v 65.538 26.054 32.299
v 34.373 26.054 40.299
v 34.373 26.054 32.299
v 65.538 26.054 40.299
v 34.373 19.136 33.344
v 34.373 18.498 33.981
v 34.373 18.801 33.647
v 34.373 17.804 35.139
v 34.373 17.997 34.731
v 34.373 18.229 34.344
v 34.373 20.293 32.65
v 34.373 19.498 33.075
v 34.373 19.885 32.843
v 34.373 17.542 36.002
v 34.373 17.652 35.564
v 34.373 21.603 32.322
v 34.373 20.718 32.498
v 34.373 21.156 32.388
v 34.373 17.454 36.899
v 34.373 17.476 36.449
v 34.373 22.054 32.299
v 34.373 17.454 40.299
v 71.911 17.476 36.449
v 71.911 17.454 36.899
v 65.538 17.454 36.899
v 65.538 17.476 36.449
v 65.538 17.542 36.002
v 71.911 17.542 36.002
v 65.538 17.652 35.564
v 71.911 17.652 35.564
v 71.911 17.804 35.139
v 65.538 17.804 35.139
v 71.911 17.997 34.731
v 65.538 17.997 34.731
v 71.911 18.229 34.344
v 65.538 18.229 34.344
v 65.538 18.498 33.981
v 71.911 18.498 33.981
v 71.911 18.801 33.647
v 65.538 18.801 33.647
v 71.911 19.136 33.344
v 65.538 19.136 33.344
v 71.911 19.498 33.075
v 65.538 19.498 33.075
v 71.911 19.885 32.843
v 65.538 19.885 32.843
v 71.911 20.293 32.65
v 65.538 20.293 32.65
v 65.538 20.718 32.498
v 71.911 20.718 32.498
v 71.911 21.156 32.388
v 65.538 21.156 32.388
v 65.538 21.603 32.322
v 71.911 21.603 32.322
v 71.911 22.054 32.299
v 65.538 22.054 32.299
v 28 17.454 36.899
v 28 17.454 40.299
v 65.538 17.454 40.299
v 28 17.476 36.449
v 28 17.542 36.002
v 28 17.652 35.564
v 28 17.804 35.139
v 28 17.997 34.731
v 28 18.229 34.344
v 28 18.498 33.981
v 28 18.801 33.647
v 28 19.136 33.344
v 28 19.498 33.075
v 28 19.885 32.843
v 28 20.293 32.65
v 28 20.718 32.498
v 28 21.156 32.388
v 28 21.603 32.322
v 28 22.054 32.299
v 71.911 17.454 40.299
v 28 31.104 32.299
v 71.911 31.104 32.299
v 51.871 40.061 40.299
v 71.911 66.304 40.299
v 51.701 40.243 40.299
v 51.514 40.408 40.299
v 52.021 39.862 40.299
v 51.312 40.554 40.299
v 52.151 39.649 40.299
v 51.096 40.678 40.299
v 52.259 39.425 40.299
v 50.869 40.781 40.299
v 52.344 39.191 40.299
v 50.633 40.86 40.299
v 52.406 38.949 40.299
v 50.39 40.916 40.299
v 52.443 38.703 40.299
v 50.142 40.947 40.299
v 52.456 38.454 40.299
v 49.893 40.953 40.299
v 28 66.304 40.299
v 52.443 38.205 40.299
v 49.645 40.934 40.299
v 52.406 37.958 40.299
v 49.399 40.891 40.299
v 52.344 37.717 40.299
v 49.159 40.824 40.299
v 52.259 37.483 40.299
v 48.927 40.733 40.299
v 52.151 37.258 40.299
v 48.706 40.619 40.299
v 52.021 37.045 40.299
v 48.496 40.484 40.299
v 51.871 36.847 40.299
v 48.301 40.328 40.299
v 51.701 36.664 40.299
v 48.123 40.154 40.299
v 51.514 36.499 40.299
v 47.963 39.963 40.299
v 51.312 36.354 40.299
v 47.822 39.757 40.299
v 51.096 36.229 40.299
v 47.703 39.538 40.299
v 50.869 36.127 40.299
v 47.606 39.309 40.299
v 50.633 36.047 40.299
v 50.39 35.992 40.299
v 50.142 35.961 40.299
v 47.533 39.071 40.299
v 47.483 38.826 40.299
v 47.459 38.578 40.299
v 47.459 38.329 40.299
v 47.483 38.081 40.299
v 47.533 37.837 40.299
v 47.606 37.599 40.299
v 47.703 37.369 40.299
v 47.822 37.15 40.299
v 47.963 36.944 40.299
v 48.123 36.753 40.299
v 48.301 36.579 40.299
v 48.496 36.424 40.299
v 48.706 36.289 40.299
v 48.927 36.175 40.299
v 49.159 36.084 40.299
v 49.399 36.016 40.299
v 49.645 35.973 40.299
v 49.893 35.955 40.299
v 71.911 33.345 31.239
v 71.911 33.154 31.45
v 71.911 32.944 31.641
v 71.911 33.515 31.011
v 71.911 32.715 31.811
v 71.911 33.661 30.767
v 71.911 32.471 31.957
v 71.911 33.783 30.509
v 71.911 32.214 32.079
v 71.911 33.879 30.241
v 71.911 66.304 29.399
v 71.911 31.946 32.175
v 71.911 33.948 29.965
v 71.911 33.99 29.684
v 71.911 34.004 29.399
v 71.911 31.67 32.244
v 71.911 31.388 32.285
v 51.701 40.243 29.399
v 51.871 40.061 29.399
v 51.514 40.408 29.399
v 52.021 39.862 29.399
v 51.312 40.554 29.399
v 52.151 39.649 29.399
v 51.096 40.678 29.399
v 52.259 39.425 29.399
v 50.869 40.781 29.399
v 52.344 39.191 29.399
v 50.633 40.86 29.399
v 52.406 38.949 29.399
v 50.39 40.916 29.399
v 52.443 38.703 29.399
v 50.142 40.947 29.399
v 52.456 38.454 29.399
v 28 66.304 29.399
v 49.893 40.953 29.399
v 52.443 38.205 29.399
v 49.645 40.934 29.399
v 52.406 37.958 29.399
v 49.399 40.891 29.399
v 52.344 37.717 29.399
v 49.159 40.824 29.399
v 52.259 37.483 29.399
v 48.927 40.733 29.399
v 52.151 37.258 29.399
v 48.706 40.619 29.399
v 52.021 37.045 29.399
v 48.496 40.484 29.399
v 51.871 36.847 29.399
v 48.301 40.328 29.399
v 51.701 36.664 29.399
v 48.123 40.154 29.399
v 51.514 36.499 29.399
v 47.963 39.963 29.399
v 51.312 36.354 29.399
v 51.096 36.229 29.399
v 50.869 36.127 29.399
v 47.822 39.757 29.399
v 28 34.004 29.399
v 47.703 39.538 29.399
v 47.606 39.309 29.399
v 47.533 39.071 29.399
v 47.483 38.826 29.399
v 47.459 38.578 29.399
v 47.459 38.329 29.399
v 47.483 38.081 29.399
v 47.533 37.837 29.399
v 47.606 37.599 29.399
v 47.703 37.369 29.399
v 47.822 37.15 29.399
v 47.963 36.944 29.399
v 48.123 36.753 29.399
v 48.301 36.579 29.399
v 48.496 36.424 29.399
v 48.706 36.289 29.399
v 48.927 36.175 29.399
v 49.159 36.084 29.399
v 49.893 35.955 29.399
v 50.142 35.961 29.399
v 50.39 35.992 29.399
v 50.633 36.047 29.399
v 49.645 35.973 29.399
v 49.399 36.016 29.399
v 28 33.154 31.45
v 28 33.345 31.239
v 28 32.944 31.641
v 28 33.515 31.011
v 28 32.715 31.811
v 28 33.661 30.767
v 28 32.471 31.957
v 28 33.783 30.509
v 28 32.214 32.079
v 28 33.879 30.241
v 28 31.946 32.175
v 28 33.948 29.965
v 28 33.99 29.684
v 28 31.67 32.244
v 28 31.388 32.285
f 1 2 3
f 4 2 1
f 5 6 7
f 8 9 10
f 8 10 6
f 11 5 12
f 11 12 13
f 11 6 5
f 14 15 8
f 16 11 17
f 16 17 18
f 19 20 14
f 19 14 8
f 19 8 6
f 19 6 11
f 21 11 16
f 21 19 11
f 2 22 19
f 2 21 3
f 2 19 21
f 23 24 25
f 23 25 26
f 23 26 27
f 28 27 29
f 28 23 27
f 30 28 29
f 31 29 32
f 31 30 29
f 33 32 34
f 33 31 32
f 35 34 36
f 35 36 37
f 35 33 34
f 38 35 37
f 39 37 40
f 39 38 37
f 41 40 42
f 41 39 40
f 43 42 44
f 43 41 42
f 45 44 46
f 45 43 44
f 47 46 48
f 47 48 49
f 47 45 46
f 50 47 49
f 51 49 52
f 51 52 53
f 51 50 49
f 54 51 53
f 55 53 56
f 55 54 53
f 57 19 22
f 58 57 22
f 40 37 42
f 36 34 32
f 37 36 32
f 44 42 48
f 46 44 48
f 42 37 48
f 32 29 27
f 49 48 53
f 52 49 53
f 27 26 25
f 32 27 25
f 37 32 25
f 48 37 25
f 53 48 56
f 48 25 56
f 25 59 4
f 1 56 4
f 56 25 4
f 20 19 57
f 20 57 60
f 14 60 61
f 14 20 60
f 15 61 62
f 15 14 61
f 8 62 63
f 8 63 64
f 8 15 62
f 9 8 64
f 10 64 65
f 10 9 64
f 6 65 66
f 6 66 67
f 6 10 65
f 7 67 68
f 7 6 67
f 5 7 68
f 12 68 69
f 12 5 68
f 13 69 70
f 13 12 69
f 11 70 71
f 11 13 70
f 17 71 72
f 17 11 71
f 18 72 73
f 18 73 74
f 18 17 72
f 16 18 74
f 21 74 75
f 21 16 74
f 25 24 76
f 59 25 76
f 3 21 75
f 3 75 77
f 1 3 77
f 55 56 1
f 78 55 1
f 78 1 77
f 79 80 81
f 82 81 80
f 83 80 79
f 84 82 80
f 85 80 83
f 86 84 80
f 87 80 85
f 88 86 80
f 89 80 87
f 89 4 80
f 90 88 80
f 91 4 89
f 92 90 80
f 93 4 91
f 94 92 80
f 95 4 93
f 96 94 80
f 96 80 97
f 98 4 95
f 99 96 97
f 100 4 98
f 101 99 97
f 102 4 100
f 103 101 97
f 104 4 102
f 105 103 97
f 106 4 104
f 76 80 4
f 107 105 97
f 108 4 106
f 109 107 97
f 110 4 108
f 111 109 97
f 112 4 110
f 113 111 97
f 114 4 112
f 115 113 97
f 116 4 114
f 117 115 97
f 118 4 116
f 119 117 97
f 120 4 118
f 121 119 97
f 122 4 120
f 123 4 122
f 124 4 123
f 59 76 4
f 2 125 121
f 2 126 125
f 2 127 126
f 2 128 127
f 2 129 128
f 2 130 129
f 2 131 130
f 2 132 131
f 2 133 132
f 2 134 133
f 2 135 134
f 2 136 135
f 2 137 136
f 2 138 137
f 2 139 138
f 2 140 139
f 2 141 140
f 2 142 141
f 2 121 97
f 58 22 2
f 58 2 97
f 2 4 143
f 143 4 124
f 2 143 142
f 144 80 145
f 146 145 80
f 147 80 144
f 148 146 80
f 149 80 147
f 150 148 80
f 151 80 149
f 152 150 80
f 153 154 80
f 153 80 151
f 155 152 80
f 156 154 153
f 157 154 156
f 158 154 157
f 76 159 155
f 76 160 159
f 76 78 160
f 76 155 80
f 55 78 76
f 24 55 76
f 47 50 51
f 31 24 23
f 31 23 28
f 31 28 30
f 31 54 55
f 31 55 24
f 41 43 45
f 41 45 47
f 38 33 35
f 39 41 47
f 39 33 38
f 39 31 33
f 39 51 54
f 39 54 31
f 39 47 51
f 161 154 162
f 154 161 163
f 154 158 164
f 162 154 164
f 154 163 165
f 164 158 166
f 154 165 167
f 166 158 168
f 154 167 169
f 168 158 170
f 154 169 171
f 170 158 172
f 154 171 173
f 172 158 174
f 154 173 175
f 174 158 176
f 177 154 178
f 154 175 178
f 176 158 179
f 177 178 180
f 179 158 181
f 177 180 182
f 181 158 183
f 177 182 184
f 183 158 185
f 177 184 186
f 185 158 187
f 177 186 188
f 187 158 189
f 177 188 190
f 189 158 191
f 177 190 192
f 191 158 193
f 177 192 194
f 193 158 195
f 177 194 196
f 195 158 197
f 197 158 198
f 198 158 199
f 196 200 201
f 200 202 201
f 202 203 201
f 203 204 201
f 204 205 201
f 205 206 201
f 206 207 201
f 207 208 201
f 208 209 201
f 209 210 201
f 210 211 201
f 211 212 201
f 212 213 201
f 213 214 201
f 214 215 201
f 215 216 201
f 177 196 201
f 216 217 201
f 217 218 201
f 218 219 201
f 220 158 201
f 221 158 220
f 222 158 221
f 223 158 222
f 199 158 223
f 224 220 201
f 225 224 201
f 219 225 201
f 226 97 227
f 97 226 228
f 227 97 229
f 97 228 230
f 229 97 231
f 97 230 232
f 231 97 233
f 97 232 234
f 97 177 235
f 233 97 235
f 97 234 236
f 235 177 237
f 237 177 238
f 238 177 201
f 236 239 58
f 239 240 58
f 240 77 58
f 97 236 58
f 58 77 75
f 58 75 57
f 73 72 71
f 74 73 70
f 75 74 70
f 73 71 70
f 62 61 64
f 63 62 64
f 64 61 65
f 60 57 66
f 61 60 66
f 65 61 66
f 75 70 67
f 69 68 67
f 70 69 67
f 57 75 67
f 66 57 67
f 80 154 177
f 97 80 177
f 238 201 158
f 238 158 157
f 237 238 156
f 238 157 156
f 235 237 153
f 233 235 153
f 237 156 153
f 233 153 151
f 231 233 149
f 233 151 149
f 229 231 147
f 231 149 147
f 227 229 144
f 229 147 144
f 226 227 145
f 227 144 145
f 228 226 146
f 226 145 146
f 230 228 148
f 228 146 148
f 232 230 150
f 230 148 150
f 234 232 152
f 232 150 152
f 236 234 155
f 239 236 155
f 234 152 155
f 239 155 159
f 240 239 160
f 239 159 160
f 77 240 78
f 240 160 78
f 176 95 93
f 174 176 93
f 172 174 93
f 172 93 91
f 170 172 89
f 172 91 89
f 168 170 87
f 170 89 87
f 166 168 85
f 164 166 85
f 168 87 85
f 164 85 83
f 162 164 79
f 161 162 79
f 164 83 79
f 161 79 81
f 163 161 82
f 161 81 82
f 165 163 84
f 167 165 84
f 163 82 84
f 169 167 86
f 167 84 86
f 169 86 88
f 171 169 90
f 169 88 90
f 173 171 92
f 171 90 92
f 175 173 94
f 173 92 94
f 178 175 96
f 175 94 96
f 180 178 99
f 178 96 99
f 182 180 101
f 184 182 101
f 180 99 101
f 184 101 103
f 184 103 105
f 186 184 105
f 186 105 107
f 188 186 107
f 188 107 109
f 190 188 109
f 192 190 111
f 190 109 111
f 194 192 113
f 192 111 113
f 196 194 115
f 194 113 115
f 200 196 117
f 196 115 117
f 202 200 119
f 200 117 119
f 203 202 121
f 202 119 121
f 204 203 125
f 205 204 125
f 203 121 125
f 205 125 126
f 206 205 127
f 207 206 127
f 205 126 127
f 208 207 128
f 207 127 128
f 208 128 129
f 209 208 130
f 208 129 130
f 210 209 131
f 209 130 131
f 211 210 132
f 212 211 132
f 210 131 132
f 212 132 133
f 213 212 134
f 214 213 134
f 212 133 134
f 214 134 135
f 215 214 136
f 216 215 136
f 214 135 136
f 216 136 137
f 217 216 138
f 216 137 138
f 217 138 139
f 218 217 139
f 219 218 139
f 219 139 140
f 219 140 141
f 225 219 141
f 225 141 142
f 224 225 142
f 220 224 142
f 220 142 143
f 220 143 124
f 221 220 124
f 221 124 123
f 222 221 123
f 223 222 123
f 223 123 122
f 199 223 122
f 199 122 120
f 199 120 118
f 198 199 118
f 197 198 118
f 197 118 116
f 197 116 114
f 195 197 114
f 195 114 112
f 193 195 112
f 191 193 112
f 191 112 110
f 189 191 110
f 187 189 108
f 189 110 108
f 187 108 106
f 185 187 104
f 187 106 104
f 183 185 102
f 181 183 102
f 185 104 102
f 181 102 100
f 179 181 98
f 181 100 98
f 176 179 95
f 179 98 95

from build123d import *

# Parameters (mm, degrees)
SKETCH001_W     = 43.9111261831
SKETCH001_H     = 56
EXTRUDE_DEPTH   = 10.9
POCKET001_DEPTH = 43.9121261831
SKETCH003_W     = 31.1652
SKETCH003_H     = 8.6
POCKET002_DEPTH = 10.901
SKETCH006_R     = 2.5
POCKET004_DEPTH = 10.9


with BuildPart() as part:
    # Sketch001 (on Face7 of Pocket) → Extrude (new body)
    with BuildSketch(Plane(origin=(66.9555630915, 66.3037746961, 29.39946064), x_dir=(-1, 0, 0), z_dir=(0, 0, 1))):
        with Locations((17, 28)):
            Rectangle(SKETCH001_W, SKETCH001_H)
    extrude(amount=EXTRUDE_DEPTH)

    # Sketch002 (on Face4 of Extrude) → Pocket001 (cut, through all)
    with BuildSketch(Plane.YZ.offset(71.9111261831)):
        with BuildLine():
            Line((10.3037746961, 29.39946064), (34.0037746961, 29.39946064))
            ThreePointArc((34.0037746961, 29.39946064), (33.1543764894, 31.4500781776), (31.1037524304, 32.29946064))
            Line((22.0537746961, 32.29946064), (31.1037524304, 32.29946064))
            ThreePointArc((17.4537746961, 36.8994600326), (18.8010836591, 33.6467691735), (22.0537746961, 32.29946064))
            Line((17.4537746961, 36.8994600326), (17.4537746961, 40.29946064))
            Line((10.3037746961, 40.29946064), (17.4537746961, 40.29946064))
            Line((10.3037746961, 40.29946064), (10.3037746961, 29.39946064))
        make_face()
    extrude(amount=-POCKET001_DEPTH, mode=Mode.SUBTRACT)

    # Sketch003 (on Face7 of Pocket001) → Pocket002 (cut, through all)
    with BuildSketch(Plane.XY.offset(40.29946064)):
        with Locations((49.9555387865, 21.7537746961)):
            Rectangle(SKETCH003_W, SKETCH003_H)
    extrude(amount=-POCKET002_DEPTH, mode=Mode.SUBTRACT)

    # Sketch006 (on Face7 of Pocket002) → Pocket004 (cut)
    with BuildSketch(Plane.XY.offset(40.29946064)):
        with Locations((49.9555630915, 38.4537746961)):
            Circle(SKETCH006_R)
    extrude(amount=-POCKET004_DEPTH, mode=Mode.SUBTRACT)


solid = part.part
